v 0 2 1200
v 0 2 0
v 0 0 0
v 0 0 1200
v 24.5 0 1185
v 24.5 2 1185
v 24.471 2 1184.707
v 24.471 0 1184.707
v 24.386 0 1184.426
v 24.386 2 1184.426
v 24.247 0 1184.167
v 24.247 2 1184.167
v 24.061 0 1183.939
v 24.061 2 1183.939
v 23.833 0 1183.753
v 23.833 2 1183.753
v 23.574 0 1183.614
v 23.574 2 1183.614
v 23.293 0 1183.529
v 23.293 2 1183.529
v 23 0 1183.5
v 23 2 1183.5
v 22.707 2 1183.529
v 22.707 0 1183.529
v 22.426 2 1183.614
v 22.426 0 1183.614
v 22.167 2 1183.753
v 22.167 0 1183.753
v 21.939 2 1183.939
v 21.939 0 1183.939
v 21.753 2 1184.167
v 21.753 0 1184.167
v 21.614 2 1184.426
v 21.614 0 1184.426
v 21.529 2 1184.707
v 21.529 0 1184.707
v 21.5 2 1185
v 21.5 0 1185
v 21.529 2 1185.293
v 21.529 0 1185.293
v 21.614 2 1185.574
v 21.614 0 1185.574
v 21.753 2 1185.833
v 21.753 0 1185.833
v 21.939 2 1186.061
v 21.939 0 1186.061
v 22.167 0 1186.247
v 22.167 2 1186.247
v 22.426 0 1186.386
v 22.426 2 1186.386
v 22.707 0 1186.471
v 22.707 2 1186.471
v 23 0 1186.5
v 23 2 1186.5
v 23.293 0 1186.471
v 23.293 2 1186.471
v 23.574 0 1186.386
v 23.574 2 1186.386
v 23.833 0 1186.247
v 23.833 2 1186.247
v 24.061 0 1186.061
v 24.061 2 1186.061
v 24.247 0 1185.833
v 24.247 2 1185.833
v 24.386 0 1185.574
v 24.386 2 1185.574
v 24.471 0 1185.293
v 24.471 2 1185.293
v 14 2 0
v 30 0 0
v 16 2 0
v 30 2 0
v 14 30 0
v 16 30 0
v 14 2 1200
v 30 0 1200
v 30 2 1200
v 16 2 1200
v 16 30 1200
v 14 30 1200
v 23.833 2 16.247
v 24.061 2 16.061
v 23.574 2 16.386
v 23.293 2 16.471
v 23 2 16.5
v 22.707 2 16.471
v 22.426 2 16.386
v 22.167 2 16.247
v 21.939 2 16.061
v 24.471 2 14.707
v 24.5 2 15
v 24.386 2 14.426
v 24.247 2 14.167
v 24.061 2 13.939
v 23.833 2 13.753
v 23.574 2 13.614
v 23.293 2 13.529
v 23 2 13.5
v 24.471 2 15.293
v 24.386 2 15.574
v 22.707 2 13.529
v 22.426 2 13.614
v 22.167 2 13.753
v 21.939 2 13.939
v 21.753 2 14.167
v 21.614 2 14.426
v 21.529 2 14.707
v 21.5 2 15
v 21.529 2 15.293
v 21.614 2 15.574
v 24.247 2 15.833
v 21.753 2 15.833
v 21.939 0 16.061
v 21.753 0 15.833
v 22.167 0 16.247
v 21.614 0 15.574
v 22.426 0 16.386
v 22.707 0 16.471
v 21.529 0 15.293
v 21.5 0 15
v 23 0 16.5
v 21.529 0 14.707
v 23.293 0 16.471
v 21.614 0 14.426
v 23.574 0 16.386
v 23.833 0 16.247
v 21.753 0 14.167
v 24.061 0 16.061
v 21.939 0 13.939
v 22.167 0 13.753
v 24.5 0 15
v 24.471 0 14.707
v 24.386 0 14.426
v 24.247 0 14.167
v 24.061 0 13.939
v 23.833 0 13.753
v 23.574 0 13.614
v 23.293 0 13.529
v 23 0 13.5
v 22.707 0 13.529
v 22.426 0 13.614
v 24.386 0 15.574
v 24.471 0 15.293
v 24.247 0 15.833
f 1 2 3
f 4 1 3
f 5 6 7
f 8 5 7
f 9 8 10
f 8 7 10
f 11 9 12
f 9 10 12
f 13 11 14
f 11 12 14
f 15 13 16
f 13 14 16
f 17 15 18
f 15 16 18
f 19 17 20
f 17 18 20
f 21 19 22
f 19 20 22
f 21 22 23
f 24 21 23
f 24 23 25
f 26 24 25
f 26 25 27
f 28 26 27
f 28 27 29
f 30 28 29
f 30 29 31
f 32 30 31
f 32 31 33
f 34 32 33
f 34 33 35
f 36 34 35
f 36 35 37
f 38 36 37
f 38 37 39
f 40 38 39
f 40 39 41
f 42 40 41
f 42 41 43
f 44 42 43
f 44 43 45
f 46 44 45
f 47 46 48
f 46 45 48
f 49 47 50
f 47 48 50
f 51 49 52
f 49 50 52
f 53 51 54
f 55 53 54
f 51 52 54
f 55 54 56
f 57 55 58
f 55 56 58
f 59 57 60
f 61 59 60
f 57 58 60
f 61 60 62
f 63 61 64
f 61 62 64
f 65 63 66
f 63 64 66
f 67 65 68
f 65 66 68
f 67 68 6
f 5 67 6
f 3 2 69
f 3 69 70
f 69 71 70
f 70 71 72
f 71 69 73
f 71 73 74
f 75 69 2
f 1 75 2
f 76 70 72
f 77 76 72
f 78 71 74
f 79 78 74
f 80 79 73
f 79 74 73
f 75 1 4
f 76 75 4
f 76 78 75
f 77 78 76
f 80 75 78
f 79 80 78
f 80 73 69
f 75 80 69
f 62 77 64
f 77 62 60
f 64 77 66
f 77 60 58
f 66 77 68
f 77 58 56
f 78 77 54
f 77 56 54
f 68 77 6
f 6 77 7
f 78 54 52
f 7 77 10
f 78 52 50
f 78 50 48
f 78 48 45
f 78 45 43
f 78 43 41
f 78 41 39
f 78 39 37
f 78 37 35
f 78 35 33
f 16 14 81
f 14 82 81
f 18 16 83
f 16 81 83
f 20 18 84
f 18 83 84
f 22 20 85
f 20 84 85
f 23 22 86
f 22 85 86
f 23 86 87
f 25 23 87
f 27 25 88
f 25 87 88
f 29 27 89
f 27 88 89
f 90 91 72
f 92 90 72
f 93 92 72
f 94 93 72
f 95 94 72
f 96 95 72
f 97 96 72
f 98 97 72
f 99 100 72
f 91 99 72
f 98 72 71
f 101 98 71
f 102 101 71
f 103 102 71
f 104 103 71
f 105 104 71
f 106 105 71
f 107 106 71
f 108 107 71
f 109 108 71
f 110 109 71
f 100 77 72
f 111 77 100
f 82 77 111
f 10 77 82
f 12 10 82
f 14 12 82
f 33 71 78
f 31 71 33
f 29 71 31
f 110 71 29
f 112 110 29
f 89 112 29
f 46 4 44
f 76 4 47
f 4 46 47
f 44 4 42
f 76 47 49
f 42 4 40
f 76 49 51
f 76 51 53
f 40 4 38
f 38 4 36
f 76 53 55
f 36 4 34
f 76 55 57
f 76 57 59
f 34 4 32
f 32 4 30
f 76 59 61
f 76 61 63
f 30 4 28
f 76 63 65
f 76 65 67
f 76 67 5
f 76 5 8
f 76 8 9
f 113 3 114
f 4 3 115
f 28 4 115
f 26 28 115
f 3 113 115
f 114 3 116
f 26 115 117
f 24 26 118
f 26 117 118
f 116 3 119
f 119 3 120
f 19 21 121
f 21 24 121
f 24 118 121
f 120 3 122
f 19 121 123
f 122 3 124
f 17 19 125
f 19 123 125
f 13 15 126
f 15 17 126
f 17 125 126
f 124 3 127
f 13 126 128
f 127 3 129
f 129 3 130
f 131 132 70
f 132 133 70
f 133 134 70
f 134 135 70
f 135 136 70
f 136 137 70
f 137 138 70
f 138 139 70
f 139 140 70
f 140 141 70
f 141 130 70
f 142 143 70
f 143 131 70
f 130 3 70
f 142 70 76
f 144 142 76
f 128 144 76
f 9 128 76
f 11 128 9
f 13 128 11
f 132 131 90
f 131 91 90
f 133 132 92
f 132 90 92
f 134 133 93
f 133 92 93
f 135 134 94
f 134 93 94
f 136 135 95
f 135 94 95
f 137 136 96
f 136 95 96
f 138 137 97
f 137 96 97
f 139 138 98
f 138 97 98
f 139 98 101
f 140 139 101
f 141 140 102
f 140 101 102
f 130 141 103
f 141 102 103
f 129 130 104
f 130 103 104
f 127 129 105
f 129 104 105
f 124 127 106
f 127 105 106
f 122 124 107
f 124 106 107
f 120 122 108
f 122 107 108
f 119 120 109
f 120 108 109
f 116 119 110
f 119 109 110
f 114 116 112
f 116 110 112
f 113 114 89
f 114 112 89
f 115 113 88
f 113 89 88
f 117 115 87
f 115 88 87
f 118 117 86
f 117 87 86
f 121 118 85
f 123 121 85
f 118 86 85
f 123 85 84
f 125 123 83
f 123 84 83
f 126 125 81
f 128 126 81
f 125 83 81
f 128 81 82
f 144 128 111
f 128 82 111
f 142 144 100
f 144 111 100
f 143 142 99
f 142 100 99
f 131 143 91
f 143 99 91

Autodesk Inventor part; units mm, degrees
ref_plane "YZ Plane" through (0, 0, 0) normal (1, 0, 0) x (0, 1, 0)
ref_plane "XZ Plane" through (0, 0, 0) normal (0, 1, 0) x (-1, 0, 0)
ref_plane "XY Plane" through (0, 0, 0) normal (0, 0, 1) x (1, 0, 0)
sketch "Náčrt1" plane through (0, 0, 0) normal (0, 0, 1) x (1, 0, 0)
  line L0 (0, 0) -> (30, 0)
  line L1 (30, 0) -> (30, 2)
  line L2 (30, 2) -> (16, 2)
  line L3 (16, 2) -> (16, 30)
  line L4 (16, 30) -> (14, 30)
  line L5 (14, 30) -> (14, 2)
  line L6 (14, 2) -> (0, 2)
  line L7 (0, 2) -> (0, 0)
  dimension "d0" = 30
  dimension "d1" = 2
  dimension "d2" = 14
  dimension "d3" = 28
  dimension "d4" = 2
extrude "Vysunutí1" add sketch "Náčrt1" along normal blind 1200
sketch "Náčrt2" plane through (16, 2, 0) normal (0, 1, 0) x (1, 0, 0)
  line L0 (0, 0) -> (0, -1200) projected
  line L1 (14, -1200) -> (0, -1200) projected
  circle A0 centre (7, -1185) radius 1.5
  line L2 (14, 0) -> (14, -1200) projected
  line L3 (14, -600) -> (0, -600)
  circle A1 centre (7, -15) radius 1.5
  point P0 (-16, 0)
  dimension "d7" = 15
  dimension "d8" = 3
extrude "Vysunutí2" cut sketch "Náčrt2" against normal up to next contours A0 | A1
equation "\"d0\" = width_A"
equation "\"d2\" = -0.5 * thickness + 0.5 * width_A"
equation "\"d3\" = width_B - thickness"
equation "\"d4\" = thickness"
equation "\"d5\" = length"
equation "\"d7\" = 0.5 * gSquareProfile_Width_Rack"
equation "\"width_A\" = 30"
equation "\"width_B\" = 30"
equation "\"thickness\" = 2"
equation "\"length\" = gRack_Cpu_Length"
equation "\"gSquareProfile_Width_Rack\" = 30"
equation "\"gRack_Cpu_Length\" = 1200"
properties part number "Profile-T#01"
